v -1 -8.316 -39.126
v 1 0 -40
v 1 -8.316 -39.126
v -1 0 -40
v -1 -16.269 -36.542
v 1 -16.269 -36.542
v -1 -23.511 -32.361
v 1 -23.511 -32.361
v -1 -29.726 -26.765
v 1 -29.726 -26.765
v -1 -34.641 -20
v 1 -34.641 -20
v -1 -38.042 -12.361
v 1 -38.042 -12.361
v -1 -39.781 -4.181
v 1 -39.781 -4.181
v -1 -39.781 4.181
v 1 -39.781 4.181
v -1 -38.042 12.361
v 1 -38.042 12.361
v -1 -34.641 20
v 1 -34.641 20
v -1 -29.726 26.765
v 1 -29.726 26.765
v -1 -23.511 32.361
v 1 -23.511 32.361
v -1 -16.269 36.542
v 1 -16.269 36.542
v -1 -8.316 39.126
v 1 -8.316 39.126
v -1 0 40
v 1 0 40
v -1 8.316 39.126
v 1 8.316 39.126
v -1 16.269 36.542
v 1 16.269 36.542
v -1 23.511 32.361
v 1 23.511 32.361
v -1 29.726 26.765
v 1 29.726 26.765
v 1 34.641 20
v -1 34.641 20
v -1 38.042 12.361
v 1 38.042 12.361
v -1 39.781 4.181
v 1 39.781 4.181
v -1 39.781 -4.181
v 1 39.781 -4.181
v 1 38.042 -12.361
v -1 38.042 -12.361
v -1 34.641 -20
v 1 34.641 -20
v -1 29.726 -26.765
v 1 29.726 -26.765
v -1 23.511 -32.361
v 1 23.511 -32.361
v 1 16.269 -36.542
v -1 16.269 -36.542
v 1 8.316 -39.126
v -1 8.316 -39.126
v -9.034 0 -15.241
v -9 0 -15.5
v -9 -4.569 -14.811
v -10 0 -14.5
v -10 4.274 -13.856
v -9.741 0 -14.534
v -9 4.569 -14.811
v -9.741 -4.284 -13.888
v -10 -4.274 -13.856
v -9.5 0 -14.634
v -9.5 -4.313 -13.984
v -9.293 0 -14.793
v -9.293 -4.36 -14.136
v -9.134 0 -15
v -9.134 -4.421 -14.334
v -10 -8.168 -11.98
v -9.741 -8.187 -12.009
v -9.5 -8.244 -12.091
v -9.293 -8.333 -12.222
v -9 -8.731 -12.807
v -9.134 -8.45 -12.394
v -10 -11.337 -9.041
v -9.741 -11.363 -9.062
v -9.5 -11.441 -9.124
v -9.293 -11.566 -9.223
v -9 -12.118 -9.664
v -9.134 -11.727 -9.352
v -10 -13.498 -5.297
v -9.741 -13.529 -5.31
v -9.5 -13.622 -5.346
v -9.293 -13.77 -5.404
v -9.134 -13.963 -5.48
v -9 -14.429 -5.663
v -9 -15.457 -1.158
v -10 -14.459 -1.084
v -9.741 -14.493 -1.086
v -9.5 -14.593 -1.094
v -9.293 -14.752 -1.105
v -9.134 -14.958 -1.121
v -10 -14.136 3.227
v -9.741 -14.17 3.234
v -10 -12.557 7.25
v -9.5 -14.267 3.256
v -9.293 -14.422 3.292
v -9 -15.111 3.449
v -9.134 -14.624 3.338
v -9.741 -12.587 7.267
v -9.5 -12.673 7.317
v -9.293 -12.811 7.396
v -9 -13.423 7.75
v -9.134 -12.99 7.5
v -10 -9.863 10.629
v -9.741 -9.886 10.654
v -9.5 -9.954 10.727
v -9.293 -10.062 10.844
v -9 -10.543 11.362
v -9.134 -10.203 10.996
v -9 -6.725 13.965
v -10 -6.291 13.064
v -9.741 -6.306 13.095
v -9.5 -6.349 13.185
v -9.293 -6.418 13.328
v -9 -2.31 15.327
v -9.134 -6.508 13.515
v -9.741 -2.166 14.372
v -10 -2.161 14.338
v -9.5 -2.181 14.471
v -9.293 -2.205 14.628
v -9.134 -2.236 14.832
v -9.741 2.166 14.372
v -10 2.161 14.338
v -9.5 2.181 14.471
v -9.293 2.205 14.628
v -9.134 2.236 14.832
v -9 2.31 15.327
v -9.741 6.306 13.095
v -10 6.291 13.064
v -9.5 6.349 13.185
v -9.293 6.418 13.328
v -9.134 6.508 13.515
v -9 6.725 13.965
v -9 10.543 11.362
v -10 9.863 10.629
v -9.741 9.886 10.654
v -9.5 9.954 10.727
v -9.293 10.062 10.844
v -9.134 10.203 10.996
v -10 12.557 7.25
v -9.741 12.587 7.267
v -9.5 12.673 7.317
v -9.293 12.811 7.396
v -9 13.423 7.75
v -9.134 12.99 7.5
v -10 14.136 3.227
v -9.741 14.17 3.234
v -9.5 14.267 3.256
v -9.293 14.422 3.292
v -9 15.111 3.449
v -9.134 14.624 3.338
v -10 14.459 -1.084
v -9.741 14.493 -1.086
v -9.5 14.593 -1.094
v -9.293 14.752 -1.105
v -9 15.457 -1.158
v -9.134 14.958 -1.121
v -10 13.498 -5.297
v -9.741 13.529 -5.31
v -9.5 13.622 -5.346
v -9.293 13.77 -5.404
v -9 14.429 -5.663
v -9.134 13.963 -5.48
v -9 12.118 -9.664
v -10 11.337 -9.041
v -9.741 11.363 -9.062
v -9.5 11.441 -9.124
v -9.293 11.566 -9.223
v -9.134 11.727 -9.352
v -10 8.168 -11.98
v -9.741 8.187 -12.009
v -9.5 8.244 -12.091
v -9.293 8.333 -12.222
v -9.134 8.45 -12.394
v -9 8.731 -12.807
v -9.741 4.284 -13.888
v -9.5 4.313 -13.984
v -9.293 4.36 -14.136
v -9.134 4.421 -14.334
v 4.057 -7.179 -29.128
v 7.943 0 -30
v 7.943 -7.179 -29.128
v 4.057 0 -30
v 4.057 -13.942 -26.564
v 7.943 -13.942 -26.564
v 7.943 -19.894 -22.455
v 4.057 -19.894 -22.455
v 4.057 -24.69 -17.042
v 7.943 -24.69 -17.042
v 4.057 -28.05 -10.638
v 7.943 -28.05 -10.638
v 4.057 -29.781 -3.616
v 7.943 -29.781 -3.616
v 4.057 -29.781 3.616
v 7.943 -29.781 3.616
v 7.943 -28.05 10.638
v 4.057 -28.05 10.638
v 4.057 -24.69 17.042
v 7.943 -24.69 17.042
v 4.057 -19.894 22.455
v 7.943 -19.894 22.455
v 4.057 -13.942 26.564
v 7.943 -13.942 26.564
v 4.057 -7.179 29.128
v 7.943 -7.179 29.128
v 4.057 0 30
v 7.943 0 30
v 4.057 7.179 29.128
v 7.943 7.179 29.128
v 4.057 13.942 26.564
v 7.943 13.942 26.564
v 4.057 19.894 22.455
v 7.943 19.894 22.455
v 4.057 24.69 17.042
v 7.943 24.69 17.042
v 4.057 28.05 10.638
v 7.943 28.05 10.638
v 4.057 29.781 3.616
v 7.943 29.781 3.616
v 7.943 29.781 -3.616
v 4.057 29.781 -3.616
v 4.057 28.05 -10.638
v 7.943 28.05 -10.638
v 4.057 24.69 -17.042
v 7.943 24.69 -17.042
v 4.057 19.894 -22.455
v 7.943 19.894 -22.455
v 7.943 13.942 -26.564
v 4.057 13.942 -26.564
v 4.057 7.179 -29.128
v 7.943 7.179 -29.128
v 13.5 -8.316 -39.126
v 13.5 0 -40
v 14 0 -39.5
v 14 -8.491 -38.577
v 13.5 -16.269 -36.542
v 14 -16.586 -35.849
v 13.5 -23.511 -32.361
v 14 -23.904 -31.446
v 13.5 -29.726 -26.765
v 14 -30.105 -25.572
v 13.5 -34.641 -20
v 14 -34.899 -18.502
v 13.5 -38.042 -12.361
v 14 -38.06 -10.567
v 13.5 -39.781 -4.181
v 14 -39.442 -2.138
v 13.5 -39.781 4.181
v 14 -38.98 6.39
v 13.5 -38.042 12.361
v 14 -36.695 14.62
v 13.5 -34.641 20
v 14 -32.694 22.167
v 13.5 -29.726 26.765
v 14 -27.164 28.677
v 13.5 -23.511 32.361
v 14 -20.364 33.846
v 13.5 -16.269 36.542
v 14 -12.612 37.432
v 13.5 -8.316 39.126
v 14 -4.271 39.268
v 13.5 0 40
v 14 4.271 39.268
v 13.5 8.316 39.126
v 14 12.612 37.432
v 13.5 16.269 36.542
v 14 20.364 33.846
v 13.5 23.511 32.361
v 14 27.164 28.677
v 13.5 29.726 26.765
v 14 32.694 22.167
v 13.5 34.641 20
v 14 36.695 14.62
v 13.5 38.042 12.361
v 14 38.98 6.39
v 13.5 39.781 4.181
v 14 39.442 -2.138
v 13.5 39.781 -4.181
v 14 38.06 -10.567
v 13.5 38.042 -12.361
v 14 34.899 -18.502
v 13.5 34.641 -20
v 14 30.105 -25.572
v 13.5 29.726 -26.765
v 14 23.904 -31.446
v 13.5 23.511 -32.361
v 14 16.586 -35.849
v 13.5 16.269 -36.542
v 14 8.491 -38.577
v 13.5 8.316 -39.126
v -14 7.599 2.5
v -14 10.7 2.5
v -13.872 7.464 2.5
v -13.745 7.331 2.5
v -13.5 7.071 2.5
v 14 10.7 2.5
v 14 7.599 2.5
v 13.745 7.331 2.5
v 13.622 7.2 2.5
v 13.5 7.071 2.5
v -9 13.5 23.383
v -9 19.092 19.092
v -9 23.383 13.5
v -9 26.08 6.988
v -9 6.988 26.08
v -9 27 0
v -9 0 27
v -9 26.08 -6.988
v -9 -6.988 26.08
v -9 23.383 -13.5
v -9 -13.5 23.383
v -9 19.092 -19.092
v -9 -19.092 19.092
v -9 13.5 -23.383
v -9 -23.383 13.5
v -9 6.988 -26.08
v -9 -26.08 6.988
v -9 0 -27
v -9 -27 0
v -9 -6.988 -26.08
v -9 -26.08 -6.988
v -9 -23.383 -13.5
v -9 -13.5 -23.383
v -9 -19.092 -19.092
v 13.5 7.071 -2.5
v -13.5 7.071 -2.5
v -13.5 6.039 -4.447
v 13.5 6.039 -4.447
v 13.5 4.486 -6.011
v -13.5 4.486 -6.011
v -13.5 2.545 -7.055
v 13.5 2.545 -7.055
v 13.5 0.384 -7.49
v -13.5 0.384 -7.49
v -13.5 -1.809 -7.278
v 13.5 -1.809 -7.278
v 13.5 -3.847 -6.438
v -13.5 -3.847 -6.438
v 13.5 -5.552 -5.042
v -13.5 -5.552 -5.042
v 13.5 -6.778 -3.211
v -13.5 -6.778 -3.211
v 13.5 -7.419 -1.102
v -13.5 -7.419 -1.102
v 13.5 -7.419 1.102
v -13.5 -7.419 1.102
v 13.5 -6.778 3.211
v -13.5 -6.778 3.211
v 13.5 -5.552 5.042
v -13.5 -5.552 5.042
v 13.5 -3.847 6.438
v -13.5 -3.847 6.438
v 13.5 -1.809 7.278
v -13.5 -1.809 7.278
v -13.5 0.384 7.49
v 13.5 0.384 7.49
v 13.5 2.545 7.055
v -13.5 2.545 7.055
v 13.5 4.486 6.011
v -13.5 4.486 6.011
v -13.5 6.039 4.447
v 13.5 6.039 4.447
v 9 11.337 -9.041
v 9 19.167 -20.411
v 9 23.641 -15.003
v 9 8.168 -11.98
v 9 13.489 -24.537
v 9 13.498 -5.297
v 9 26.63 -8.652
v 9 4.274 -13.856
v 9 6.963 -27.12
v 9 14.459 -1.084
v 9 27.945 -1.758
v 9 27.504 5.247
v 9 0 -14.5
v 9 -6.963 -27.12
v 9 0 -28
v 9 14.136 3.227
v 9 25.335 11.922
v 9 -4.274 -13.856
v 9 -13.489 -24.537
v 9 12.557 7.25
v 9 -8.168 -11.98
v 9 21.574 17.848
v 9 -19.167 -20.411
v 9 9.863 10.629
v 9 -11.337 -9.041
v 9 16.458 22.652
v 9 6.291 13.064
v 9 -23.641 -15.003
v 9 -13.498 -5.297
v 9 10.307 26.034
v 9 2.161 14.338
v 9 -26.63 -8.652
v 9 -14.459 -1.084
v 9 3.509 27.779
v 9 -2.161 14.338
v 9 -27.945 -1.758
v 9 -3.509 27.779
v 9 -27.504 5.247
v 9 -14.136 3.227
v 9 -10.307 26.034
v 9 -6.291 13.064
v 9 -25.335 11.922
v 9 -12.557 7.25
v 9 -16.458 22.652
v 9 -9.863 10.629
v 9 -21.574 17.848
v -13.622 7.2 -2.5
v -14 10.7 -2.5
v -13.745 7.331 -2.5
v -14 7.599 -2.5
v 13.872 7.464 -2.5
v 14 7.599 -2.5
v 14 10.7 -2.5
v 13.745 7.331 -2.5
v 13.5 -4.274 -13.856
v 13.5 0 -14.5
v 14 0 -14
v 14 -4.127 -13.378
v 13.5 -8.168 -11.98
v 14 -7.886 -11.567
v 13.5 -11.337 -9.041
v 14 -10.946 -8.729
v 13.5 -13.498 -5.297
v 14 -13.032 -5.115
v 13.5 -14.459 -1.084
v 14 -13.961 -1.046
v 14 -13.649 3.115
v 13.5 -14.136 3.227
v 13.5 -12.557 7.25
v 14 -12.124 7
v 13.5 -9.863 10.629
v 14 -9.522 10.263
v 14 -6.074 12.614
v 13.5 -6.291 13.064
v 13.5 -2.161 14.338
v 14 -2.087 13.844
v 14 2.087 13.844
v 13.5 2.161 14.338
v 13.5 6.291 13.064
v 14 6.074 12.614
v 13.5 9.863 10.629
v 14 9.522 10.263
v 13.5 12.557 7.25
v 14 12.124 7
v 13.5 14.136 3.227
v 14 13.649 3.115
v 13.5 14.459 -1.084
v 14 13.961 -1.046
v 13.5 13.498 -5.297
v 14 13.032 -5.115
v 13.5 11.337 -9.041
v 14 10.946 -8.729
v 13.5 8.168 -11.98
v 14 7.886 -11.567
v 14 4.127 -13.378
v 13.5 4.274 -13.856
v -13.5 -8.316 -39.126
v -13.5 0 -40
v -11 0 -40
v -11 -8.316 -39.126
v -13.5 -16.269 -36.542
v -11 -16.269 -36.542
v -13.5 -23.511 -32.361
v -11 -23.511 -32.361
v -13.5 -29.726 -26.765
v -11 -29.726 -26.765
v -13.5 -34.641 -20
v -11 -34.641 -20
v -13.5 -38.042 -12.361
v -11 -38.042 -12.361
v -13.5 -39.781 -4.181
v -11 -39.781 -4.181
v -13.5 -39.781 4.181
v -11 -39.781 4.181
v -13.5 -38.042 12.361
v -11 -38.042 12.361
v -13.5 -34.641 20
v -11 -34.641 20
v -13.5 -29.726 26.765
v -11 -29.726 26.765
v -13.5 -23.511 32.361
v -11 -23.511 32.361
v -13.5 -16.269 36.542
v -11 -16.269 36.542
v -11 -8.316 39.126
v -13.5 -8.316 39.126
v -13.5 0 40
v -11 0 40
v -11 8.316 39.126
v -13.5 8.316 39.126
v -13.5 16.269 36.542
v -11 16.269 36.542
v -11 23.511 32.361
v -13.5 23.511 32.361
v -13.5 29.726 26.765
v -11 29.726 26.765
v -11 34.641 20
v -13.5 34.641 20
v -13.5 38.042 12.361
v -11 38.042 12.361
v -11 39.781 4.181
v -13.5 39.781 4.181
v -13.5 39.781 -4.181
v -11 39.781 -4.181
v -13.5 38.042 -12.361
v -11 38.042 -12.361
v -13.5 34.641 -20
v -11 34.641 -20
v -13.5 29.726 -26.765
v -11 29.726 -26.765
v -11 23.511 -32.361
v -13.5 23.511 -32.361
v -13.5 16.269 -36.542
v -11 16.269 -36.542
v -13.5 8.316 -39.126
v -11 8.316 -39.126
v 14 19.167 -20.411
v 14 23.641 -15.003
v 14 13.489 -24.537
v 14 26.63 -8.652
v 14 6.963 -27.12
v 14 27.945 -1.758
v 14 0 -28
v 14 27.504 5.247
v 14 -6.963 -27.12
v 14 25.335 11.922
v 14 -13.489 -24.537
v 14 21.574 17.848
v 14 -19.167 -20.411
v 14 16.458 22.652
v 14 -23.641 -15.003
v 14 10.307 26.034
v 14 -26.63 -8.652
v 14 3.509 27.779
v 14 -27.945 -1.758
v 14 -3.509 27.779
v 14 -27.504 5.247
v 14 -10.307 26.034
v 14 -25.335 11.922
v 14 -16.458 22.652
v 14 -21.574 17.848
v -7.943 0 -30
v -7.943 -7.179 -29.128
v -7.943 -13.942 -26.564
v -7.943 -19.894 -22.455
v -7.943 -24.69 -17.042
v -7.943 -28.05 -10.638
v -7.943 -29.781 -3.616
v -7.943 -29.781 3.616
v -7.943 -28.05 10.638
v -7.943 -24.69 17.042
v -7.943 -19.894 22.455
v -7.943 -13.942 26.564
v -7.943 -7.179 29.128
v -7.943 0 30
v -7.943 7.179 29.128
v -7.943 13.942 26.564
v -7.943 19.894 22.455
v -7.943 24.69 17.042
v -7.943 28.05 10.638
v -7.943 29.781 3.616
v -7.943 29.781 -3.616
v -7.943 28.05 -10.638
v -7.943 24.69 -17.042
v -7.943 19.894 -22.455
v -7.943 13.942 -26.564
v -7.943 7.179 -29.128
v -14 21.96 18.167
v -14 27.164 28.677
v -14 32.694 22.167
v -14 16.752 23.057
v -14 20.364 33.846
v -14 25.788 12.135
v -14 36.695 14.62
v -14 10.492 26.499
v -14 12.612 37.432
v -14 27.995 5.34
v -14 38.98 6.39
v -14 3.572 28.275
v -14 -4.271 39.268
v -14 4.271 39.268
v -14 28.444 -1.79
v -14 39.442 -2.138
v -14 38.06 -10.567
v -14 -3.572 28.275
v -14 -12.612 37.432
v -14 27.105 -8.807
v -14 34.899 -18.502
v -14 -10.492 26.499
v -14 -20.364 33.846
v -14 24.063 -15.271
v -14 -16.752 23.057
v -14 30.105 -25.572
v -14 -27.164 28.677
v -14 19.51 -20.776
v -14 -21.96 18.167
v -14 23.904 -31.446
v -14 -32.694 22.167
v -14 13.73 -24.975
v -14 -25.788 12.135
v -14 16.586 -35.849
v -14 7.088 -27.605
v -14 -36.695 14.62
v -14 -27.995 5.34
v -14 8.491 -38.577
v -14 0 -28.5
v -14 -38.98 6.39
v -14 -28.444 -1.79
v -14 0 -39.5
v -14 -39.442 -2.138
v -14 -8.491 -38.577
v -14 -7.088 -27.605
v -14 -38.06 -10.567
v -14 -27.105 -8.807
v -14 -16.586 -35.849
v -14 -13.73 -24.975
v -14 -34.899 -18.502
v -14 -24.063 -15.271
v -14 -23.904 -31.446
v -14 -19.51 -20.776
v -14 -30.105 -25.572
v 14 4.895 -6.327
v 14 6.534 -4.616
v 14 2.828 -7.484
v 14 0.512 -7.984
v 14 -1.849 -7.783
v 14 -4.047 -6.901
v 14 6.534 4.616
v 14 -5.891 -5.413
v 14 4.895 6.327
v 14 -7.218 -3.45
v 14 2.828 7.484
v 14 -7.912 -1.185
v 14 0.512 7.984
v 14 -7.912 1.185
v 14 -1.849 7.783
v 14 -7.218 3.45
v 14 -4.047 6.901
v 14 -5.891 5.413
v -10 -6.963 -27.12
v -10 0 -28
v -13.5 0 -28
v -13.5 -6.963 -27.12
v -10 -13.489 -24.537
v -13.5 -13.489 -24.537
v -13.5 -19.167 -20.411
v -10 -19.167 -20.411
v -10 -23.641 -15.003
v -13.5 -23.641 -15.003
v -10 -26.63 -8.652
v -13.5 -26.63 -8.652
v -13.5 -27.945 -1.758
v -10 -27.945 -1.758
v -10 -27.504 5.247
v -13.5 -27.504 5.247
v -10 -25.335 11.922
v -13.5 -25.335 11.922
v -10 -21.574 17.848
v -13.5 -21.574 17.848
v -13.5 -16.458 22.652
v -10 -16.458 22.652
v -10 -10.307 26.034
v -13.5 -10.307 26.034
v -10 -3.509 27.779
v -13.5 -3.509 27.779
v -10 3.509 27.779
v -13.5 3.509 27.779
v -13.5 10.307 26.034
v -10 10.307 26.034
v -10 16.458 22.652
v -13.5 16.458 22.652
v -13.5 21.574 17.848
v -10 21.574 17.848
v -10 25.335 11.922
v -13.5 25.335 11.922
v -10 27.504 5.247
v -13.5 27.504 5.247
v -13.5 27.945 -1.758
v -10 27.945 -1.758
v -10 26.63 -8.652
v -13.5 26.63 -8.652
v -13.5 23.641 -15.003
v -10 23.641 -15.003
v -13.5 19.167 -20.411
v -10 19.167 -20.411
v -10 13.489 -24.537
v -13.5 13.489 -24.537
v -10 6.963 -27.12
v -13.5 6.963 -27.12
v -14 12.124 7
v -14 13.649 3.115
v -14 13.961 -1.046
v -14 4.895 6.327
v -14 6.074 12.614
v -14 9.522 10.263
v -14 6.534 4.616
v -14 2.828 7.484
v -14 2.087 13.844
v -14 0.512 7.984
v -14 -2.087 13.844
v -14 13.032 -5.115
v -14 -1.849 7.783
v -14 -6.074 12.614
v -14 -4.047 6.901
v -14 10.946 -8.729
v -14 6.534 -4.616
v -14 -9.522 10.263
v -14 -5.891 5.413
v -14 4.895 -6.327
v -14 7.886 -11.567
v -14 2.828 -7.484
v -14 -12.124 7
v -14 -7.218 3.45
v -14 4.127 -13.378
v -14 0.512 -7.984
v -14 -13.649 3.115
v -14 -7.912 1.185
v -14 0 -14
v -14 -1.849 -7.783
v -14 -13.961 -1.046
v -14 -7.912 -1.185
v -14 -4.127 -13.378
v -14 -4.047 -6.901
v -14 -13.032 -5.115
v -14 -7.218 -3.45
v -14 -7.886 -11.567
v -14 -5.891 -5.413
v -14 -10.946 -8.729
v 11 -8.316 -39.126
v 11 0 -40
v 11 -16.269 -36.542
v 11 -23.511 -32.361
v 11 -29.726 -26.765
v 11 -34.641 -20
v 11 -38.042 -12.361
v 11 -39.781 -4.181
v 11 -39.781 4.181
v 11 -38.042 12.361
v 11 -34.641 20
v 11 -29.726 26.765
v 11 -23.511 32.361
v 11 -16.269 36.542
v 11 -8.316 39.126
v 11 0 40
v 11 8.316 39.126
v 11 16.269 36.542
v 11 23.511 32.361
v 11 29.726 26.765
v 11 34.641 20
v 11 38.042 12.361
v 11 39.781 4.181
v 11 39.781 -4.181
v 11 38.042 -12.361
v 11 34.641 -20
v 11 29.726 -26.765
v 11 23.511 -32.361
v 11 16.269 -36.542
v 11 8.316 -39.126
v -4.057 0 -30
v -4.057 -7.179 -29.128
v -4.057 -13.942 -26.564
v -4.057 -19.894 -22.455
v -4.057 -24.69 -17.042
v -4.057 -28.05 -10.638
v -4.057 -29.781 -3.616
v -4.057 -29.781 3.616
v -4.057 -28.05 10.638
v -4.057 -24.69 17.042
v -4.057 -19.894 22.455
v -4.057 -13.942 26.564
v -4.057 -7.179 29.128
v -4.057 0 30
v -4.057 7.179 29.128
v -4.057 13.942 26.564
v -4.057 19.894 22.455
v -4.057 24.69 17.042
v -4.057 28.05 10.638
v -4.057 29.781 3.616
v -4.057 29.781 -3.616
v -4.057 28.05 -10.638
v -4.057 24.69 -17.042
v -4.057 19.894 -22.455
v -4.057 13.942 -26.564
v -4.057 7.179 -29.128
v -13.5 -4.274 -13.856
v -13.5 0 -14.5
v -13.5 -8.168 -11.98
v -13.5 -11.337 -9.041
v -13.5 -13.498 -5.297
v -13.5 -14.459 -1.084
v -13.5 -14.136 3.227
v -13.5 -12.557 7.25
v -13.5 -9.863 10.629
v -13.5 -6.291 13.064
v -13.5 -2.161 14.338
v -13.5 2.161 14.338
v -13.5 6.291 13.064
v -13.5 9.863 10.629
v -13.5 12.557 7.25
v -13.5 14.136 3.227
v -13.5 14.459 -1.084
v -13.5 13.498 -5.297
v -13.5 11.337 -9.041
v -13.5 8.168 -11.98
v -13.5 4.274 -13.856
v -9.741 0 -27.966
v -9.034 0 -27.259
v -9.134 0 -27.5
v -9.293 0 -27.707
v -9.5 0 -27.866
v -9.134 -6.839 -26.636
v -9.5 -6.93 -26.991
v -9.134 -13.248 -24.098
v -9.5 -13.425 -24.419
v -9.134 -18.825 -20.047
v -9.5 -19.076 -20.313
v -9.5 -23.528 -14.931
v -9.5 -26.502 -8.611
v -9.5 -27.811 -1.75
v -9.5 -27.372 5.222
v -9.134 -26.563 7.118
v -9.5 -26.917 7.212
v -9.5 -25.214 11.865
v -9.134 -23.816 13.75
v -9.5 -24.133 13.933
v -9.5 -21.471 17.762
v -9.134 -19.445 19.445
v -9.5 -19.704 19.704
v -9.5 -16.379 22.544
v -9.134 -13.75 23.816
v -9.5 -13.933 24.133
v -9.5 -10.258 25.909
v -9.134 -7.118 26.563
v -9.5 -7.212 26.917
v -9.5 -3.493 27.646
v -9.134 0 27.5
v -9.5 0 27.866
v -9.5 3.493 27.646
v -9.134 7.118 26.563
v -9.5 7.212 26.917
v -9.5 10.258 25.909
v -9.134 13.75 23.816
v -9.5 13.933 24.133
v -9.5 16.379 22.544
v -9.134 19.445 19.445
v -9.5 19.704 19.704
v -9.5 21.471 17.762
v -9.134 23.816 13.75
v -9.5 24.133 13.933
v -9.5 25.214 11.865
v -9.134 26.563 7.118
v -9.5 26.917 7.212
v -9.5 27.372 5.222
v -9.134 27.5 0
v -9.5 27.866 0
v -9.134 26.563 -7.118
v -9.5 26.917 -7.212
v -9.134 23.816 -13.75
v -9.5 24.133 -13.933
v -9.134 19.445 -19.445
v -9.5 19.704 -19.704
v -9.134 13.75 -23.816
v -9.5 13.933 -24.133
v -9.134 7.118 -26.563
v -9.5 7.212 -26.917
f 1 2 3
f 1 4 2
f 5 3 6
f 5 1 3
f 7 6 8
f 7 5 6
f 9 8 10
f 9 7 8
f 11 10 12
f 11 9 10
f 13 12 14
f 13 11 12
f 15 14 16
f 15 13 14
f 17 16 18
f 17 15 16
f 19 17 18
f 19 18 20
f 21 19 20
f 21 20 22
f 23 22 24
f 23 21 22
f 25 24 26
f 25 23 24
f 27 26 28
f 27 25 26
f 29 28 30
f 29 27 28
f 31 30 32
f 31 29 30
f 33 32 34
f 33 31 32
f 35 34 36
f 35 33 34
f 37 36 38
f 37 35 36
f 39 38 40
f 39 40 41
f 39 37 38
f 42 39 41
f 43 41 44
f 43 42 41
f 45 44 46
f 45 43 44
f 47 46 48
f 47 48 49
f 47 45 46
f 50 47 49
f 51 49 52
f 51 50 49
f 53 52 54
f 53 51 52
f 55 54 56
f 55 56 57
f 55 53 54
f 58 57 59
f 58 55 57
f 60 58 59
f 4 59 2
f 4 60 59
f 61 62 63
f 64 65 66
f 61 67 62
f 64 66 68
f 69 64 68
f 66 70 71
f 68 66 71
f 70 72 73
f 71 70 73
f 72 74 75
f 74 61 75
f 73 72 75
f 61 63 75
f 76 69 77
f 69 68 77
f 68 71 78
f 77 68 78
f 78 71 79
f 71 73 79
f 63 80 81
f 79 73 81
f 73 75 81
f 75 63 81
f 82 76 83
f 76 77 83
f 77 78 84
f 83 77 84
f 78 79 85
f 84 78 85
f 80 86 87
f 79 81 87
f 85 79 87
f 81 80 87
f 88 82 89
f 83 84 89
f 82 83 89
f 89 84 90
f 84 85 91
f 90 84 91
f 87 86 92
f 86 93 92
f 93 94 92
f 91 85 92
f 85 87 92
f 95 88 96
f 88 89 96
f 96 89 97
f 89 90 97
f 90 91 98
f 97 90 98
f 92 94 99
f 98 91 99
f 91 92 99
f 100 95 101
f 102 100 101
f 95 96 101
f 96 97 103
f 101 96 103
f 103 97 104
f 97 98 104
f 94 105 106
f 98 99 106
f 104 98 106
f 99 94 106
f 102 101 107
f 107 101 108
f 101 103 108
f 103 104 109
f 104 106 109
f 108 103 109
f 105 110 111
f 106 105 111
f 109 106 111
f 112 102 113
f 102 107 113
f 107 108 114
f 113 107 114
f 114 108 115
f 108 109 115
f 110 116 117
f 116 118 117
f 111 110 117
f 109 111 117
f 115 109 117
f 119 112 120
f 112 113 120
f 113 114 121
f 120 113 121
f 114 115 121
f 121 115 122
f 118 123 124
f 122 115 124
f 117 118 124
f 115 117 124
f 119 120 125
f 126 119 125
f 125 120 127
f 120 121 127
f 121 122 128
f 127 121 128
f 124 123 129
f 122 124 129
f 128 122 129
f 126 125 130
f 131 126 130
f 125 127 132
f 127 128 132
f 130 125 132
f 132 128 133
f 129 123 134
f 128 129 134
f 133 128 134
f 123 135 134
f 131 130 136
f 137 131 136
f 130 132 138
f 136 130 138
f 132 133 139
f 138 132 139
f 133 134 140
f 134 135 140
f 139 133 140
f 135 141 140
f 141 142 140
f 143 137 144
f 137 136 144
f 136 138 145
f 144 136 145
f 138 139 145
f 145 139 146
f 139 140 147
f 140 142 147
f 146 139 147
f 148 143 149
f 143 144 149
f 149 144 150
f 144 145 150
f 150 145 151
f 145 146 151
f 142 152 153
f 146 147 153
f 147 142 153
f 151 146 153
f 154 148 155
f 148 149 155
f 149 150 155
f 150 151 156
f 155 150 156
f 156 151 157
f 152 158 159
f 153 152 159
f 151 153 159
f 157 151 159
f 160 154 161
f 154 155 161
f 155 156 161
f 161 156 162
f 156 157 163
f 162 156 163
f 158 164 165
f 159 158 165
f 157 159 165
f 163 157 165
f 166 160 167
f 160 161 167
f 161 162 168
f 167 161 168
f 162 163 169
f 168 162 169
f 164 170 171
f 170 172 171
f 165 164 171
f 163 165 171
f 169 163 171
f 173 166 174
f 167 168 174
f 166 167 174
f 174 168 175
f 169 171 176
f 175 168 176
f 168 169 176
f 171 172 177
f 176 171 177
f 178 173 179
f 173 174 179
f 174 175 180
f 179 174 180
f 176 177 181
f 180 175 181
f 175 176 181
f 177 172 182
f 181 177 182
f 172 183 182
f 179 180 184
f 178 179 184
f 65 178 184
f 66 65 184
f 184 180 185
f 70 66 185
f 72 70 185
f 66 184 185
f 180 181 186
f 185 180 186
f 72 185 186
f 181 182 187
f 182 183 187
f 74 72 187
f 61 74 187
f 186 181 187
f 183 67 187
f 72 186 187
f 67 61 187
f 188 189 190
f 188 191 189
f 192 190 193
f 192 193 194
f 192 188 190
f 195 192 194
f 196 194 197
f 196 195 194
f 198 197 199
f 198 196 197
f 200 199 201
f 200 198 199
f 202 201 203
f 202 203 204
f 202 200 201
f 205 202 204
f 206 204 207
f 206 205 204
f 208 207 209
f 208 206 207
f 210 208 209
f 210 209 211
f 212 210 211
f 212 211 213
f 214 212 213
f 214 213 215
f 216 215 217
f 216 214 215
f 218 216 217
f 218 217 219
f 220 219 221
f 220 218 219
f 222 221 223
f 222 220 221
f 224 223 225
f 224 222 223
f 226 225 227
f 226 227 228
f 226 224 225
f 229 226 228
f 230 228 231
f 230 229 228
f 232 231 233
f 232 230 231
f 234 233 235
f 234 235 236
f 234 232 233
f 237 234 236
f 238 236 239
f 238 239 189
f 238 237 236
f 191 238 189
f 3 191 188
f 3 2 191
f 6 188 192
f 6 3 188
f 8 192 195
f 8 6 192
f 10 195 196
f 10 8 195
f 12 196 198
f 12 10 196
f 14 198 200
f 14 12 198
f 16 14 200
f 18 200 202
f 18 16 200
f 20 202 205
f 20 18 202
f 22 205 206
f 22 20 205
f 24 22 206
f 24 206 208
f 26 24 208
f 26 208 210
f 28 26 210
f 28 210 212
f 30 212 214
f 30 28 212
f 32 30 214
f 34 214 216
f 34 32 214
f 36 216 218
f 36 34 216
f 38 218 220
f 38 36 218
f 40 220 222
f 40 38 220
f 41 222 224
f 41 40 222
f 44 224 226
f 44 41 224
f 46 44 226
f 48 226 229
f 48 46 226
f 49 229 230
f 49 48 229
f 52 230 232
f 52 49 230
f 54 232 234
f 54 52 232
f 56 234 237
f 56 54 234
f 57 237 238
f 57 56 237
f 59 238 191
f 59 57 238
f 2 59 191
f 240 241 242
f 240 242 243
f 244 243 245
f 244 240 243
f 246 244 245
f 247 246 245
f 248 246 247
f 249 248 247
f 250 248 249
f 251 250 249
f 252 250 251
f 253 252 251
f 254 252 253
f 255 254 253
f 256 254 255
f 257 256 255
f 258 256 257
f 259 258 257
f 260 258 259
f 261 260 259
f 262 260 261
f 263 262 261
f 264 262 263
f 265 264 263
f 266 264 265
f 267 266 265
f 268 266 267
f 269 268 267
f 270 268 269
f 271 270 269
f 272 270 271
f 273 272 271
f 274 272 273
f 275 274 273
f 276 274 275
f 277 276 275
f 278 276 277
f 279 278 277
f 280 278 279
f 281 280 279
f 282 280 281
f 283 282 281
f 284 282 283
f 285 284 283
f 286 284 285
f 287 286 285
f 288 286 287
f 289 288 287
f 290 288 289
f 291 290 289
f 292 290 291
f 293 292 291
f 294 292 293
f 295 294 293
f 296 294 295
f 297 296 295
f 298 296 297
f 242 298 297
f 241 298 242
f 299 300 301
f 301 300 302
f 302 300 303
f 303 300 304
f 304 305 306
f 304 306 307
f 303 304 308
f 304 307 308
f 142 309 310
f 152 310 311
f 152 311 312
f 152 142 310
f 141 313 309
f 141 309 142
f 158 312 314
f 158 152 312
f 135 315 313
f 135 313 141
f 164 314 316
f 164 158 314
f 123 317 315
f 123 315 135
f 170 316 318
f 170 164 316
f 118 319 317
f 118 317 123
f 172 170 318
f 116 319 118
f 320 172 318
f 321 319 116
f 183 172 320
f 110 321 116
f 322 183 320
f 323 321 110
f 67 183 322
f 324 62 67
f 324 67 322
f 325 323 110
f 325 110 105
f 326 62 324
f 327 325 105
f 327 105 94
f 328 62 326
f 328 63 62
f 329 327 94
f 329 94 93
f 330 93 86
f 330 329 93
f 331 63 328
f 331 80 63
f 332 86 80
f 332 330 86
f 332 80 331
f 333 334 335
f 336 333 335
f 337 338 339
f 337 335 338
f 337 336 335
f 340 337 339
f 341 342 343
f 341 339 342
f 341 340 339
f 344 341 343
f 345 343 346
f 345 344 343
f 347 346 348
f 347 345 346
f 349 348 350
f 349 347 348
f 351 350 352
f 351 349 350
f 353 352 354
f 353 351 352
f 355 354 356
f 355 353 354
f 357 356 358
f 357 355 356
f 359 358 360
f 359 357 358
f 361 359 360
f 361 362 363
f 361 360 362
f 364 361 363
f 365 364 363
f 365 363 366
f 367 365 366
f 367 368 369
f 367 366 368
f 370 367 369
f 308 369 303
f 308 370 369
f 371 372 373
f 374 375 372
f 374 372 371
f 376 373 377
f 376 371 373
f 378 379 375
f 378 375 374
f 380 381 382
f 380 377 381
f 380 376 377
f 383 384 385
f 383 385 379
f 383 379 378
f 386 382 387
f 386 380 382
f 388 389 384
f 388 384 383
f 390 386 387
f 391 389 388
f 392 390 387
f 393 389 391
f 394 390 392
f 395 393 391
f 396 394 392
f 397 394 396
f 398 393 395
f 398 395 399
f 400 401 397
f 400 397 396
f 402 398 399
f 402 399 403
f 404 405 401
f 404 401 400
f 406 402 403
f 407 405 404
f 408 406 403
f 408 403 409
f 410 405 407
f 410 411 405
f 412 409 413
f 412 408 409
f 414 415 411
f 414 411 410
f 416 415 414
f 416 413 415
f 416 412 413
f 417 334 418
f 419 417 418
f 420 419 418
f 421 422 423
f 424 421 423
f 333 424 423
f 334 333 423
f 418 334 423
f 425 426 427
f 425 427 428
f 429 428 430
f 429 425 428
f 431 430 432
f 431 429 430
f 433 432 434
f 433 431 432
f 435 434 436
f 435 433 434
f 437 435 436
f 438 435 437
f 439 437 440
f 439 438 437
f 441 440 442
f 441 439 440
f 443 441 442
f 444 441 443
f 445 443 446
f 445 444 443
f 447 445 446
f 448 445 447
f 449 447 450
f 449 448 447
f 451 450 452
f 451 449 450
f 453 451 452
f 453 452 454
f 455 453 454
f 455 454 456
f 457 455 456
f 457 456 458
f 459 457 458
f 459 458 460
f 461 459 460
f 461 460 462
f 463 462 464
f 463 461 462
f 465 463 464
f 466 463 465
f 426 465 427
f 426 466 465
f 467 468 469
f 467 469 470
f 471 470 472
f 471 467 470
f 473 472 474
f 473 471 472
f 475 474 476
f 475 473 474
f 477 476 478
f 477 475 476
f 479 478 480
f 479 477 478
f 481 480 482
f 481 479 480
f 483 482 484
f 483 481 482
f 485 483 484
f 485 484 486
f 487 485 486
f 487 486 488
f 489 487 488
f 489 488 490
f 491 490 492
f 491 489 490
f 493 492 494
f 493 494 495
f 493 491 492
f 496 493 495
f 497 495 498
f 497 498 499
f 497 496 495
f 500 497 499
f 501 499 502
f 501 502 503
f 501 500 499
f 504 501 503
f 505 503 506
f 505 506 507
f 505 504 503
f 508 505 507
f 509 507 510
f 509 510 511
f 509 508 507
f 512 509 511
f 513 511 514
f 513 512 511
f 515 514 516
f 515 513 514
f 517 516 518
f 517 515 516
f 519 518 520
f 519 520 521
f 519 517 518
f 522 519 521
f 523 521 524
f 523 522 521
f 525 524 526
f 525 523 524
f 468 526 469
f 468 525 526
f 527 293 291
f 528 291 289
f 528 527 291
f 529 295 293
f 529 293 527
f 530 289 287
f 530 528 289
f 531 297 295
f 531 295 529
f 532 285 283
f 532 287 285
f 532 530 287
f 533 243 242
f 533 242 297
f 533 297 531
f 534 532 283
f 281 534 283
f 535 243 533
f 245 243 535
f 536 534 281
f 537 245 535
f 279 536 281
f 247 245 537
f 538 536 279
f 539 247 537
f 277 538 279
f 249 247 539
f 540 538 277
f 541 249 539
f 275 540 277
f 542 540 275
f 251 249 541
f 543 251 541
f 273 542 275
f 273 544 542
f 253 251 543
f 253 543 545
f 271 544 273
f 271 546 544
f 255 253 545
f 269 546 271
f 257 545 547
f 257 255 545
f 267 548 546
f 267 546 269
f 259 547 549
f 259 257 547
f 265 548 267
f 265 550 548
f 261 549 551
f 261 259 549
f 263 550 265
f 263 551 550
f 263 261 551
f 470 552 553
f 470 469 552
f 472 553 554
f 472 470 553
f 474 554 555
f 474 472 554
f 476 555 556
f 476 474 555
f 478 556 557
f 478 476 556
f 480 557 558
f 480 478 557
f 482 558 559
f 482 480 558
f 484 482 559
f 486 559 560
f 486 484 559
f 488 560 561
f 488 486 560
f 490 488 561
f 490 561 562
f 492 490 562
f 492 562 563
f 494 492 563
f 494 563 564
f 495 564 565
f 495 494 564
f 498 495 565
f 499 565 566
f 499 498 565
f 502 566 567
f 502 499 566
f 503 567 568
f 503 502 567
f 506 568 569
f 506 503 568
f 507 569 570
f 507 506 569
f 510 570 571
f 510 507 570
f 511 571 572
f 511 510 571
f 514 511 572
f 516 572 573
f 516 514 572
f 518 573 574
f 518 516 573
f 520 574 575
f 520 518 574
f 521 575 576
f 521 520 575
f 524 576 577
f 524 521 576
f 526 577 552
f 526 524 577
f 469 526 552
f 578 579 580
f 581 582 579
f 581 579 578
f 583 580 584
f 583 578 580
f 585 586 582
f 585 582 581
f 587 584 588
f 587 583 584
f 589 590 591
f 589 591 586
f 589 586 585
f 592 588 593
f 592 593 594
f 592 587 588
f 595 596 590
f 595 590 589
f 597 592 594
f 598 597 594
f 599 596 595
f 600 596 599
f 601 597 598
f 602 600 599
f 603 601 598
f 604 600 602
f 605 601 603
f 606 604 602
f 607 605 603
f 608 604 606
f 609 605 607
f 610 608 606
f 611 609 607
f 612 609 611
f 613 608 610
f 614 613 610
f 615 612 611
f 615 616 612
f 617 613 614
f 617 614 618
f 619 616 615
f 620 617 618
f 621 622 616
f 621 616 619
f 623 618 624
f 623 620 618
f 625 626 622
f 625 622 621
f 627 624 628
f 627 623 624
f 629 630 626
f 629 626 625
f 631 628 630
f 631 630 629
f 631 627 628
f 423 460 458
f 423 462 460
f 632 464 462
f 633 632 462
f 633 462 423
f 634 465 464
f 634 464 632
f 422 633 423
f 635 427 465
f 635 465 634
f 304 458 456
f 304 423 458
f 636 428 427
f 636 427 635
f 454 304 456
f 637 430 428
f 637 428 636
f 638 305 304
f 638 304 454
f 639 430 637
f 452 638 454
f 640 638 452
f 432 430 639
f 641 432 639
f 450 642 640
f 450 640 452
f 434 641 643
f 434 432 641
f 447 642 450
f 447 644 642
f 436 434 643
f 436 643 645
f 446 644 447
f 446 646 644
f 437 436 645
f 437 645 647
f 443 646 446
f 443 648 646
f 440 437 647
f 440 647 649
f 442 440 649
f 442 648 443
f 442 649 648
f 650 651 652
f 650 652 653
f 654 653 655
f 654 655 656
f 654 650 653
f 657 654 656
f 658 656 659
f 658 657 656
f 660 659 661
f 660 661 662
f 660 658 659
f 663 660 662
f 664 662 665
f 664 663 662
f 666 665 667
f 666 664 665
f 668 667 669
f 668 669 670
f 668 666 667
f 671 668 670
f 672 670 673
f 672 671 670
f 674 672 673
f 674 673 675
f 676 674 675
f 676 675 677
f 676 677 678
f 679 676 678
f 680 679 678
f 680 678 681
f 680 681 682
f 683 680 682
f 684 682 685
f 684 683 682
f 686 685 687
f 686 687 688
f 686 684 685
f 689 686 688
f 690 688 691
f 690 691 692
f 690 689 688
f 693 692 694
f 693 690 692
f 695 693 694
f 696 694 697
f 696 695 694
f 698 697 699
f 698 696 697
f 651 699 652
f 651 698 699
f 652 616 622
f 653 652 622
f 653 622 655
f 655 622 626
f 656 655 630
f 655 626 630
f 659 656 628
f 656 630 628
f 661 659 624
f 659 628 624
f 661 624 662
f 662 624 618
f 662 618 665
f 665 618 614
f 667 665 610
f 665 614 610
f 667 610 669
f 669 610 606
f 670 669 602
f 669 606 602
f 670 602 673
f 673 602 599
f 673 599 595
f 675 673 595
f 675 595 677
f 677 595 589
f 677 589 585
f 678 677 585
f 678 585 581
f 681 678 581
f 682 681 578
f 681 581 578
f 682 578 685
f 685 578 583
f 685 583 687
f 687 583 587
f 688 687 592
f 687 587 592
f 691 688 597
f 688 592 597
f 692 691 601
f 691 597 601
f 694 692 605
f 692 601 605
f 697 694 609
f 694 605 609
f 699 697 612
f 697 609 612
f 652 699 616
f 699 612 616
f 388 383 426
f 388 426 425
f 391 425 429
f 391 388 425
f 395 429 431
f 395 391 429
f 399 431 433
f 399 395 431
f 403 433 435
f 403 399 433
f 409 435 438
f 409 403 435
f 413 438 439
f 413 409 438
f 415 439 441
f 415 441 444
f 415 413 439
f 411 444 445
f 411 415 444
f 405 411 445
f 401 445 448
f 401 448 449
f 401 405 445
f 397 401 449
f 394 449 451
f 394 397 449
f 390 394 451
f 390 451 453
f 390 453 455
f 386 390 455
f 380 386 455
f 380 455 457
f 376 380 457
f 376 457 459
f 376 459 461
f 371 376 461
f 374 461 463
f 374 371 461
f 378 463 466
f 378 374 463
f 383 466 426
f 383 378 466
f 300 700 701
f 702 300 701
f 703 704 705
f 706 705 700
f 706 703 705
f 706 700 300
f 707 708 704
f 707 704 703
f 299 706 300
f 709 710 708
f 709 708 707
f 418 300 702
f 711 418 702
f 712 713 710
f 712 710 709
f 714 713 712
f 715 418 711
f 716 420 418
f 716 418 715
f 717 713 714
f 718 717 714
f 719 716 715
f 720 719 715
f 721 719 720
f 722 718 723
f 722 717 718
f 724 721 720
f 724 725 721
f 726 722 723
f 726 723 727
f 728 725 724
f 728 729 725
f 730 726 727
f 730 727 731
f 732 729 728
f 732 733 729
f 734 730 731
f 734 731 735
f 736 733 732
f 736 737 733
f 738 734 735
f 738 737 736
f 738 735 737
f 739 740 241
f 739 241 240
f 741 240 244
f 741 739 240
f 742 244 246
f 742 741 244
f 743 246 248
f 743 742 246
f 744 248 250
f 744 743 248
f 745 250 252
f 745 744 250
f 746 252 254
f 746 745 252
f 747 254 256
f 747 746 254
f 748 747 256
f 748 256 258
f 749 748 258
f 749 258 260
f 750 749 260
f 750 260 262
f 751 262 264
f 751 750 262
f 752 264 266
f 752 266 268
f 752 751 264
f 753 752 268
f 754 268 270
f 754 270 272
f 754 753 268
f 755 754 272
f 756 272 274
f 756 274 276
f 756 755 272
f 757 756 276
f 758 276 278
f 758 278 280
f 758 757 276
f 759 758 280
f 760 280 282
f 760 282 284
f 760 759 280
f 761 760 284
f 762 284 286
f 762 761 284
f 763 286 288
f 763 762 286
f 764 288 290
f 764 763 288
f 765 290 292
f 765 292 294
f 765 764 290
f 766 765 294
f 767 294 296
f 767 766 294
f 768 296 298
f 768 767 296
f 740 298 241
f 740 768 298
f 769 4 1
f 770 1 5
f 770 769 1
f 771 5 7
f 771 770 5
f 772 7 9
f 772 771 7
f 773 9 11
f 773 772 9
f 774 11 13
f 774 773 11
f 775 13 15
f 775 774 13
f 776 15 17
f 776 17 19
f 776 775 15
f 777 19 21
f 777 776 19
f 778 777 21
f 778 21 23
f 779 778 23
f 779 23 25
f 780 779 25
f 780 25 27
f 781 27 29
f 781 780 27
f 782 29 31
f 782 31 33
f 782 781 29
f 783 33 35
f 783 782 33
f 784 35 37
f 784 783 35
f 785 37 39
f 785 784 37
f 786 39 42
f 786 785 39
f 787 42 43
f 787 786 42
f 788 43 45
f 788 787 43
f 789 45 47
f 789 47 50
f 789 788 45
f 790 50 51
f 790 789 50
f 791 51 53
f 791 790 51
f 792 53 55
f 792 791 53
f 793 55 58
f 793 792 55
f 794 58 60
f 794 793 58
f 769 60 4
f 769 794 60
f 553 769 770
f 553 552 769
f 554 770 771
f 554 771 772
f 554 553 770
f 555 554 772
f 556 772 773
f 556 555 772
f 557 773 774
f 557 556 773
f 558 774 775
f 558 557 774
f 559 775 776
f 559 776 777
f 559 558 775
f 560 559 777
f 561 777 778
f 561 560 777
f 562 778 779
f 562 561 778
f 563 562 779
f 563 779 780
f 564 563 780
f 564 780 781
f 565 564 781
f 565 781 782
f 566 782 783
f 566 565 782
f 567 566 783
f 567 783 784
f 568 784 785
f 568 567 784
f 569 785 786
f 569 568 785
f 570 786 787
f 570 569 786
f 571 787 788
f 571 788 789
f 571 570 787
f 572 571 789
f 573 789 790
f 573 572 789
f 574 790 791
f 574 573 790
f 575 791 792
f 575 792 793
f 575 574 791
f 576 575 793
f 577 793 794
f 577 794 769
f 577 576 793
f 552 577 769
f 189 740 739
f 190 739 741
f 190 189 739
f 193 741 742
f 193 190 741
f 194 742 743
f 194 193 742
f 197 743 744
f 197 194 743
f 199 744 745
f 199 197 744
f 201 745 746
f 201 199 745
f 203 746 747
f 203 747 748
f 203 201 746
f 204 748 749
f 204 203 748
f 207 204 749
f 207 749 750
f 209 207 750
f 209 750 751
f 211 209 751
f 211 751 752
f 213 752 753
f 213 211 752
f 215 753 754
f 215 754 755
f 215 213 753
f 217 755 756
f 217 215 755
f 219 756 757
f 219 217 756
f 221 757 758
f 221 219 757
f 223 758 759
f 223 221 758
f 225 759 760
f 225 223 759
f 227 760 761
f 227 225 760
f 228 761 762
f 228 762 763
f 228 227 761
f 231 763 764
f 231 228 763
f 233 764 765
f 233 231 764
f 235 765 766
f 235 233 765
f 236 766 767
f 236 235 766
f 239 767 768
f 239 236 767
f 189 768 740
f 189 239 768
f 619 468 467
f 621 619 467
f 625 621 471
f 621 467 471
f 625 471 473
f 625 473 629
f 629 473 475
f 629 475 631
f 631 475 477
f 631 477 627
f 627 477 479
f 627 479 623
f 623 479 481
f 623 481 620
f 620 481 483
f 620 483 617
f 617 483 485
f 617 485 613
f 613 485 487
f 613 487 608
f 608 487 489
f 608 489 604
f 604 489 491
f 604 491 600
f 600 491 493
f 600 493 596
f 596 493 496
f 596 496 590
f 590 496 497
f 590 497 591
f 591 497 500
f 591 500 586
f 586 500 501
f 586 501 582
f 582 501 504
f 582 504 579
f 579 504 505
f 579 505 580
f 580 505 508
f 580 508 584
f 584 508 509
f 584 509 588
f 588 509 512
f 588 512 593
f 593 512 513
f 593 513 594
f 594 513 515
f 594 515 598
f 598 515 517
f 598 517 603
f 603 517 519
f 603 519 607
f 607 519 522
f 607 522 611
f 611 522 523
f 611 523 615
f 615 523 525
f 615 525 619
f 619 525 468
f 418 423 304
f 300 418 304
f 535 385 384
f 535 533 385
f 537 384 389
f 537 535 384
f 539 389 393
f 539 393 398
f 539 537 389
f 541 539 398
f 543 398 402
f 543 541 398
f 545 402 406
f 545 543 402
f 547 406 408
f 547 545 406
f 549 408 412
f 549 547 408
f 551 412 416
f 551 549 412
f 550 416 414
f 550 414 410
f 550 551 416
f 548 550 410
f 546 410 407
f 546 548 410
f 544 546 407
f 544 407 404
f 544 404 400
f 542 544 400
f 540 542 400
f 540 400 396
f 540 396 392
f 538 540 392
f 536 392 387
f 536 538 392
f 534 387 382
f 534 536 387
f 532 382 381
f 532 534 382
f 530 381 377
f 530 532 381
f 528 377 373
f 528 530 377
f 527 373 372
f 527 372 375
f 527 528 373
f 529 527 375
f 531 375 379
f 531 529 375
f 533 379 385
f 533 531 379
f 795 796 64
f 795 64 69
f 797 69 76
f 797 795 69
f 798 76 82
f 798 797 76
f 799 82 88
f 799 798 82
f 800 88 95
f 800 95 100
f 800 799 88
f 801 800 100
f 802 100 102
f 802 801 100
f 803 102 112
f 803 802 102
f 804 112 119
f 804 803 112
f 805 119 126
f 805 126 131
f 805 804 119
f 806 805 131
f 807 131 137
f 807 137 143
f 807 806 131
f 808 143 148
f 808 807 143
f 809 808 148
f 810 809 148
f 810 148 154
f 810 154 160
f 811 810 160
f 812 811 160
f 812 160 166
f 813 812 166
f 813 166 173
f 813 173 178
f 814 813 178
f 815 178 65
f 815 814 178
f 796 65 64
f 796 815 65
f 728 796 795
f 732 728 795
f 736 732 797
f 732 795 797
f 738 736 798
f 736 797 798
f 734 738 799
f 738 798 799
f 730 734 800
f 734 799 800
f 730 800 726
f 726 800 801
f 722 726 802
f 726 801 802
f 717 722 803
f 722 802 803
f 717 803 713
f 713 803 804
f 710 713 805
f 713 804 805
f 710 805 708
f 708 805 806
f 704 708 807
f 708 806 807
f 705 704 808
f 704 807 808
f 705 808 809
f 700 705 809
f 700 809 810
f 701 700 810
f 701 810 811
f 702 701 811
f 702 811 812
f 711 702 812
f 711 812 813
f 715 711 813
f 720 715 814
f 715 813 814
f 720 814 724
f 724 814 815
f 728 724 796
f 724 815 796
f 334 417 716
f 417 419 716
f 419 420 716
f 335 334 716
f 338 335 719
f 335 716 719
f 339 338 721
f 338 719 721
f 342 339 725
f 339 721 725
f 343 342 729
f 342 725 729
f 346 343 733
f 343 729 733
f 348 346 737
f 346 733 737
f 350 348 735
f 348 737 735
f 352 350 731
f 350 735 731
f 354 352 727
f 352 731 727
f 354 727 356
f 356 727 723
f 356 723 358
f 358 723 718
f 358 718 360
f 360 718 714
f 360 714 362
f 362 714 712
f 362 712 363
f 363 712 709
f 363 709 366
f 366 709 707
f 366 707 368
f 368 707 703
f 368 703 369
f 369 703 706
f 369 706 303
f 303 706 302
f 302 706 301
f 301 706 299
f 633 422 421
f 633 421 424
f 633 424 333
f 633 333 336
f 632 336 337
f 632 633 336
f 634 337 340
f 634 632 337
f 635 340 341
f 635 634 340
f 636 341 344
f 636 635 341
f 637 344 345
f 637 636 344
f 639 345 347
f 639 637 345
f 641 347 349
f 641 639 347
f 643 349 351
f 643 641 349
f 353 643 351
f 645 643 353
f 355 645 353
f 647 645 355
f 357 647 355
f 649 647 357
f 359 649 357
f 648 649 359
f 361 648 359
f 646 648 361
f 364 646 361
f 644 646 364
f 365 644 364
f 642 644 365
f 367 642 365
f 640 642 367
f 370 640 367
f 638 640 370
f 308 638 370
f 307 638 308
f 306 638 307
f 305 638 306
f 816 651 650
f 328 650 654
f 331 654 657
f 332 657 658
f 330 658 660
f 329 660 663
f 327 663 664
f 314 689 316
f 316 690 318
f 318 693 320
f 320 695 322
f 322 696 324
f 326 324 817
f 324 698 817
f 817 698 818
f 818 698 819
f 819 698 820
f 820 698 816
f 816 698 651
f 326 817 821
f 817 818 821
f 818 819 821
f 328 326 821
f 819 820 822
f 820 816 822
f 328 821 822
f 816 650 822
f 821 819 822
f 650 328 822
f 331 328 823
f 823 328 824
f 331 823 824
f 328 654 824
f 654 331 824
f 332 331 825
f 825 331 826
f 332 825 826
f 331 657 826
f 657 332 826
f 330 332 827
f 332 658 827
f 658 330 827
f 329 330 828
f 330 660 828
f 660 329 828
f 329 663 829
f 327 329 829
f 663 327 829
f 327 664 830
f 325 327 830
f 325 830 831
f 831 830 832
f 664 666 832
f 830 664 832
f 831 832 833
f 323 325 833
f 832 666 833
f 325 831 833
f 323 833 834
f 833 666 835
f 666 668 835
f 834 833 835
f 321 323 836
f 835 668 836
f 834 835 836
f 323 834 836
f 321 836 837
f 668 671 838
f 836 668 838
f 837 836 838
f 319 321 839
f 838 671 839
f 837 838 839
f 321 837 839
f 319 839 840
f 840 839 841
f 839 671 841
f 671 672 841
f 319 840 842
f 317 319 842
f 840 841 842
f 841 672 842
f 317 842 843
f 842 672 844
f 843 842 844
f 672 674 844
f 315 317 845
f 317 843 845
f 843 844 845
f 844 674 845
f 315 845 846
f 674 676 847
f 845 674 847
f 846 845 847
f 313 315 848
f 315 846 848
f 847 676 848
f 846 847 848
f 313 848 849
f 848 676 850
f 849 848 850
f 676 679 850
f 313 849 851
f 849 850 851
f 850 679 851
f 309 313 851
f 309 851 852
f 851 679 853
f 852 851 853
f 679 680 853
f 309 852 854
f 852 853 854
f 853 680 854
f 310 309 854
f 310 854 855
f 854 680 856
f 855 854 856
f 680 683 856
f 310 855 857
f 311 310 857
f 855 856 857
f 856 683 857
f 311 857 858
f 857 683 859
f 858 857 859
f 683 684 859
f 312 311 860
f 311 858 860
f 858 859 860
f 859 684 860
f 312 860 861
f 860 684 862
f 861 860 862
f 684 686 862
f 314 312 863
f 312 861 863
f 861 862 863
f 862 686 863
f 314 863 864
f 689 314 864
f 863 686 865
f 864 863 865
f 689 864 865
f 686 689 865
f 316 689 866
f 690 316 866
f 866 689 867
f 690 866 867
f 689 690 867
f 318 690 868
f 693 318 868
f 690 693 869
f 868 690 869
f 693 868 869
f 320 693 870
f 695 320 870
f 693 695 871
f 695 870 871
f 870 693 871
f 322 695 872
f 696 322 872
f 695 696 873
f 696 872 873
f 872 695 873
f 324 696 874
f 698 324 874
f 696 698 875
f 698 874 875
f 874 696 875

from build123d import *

# Parameters (mm, degrees)
CHAMFER1_SIZE      = 0.5
CHAMFER2_SIZE      = 0.5
FILLET2_R          = 1
CUT_EXTRUDE1_DEPTH = 64.118935352


with BuildPart() as part:
    # Sketch1 → Revolve1 (revolve)
    with BuildSketch(Plane(origin=(0, 0, 0), x_dir=(1, 0, 0), z_dir=(0, 1, 0))):
        Polygon((-14, 40), (-14, 28), (-9, 28), (-9, 14.5), (-14, 14.5), (-14, 7.5), (14, 7.5), (14, 14.5), (9, 14.5), (9, 28), (14, 28), (14, 40), (11, 40), (7.942693185, 30), (4.057306815, 30), (1, 40), (-1, 40), (-4.057306815, 30), (-7.942693185, 30), (-11, 40), align=None)
    revolve(axis=Axis((0, 0, 0), (-1, 0, 0)))

    # Chamfer1
    chamfer1_edges = [part.edges().sort_by_distance(p)[0] for p in [
        (14, 0, 7.5),
        (14, 0, 14.5),
        (14, 0, 40),
    ]]
    chamfer(chamfer1_edges, length=CHAMFER1_SIZE)

    # Chamfer2
    chamfer2_edges = [part.edges().sort_by_distance(p)[0] for p in [
        (-14, 0, 40),
        (-14, 0, 28),
        (-14, 0, 14.5),
        (-14, 0, 7.5),
    ]]
    chamfer(chamfer2_edges, length=CHAMFER2_SIZE)

    # Fillet2
    fillet2_edges = [part.edges().sort_by_distance(p)[0] for p in [
        (-9, 0, 28),
        (-9, 0, 14.5),
    ]]
    fillet(fillet2_edges, radius=FILLET2_R)

    # Sketch2 → Cut-Extrude1 (cut, through all)
    with BuildSketch(Plane(origin=(14, 0, 0), x_dir=(0, 0, -1), z_dir=(1, 0, 0))):
        Polygon((-2.5, 7.5), (-2.5, 5.832980878), (2.5, 5.832980878), (2.5, 7.5), (2.5, 10.7), (-2.5, 10.7), align=None)
    extrude(amount=-CUT_EXTRUDE1_DEPTH, mode=Mode.SUBTRACT)


solid = part.part
